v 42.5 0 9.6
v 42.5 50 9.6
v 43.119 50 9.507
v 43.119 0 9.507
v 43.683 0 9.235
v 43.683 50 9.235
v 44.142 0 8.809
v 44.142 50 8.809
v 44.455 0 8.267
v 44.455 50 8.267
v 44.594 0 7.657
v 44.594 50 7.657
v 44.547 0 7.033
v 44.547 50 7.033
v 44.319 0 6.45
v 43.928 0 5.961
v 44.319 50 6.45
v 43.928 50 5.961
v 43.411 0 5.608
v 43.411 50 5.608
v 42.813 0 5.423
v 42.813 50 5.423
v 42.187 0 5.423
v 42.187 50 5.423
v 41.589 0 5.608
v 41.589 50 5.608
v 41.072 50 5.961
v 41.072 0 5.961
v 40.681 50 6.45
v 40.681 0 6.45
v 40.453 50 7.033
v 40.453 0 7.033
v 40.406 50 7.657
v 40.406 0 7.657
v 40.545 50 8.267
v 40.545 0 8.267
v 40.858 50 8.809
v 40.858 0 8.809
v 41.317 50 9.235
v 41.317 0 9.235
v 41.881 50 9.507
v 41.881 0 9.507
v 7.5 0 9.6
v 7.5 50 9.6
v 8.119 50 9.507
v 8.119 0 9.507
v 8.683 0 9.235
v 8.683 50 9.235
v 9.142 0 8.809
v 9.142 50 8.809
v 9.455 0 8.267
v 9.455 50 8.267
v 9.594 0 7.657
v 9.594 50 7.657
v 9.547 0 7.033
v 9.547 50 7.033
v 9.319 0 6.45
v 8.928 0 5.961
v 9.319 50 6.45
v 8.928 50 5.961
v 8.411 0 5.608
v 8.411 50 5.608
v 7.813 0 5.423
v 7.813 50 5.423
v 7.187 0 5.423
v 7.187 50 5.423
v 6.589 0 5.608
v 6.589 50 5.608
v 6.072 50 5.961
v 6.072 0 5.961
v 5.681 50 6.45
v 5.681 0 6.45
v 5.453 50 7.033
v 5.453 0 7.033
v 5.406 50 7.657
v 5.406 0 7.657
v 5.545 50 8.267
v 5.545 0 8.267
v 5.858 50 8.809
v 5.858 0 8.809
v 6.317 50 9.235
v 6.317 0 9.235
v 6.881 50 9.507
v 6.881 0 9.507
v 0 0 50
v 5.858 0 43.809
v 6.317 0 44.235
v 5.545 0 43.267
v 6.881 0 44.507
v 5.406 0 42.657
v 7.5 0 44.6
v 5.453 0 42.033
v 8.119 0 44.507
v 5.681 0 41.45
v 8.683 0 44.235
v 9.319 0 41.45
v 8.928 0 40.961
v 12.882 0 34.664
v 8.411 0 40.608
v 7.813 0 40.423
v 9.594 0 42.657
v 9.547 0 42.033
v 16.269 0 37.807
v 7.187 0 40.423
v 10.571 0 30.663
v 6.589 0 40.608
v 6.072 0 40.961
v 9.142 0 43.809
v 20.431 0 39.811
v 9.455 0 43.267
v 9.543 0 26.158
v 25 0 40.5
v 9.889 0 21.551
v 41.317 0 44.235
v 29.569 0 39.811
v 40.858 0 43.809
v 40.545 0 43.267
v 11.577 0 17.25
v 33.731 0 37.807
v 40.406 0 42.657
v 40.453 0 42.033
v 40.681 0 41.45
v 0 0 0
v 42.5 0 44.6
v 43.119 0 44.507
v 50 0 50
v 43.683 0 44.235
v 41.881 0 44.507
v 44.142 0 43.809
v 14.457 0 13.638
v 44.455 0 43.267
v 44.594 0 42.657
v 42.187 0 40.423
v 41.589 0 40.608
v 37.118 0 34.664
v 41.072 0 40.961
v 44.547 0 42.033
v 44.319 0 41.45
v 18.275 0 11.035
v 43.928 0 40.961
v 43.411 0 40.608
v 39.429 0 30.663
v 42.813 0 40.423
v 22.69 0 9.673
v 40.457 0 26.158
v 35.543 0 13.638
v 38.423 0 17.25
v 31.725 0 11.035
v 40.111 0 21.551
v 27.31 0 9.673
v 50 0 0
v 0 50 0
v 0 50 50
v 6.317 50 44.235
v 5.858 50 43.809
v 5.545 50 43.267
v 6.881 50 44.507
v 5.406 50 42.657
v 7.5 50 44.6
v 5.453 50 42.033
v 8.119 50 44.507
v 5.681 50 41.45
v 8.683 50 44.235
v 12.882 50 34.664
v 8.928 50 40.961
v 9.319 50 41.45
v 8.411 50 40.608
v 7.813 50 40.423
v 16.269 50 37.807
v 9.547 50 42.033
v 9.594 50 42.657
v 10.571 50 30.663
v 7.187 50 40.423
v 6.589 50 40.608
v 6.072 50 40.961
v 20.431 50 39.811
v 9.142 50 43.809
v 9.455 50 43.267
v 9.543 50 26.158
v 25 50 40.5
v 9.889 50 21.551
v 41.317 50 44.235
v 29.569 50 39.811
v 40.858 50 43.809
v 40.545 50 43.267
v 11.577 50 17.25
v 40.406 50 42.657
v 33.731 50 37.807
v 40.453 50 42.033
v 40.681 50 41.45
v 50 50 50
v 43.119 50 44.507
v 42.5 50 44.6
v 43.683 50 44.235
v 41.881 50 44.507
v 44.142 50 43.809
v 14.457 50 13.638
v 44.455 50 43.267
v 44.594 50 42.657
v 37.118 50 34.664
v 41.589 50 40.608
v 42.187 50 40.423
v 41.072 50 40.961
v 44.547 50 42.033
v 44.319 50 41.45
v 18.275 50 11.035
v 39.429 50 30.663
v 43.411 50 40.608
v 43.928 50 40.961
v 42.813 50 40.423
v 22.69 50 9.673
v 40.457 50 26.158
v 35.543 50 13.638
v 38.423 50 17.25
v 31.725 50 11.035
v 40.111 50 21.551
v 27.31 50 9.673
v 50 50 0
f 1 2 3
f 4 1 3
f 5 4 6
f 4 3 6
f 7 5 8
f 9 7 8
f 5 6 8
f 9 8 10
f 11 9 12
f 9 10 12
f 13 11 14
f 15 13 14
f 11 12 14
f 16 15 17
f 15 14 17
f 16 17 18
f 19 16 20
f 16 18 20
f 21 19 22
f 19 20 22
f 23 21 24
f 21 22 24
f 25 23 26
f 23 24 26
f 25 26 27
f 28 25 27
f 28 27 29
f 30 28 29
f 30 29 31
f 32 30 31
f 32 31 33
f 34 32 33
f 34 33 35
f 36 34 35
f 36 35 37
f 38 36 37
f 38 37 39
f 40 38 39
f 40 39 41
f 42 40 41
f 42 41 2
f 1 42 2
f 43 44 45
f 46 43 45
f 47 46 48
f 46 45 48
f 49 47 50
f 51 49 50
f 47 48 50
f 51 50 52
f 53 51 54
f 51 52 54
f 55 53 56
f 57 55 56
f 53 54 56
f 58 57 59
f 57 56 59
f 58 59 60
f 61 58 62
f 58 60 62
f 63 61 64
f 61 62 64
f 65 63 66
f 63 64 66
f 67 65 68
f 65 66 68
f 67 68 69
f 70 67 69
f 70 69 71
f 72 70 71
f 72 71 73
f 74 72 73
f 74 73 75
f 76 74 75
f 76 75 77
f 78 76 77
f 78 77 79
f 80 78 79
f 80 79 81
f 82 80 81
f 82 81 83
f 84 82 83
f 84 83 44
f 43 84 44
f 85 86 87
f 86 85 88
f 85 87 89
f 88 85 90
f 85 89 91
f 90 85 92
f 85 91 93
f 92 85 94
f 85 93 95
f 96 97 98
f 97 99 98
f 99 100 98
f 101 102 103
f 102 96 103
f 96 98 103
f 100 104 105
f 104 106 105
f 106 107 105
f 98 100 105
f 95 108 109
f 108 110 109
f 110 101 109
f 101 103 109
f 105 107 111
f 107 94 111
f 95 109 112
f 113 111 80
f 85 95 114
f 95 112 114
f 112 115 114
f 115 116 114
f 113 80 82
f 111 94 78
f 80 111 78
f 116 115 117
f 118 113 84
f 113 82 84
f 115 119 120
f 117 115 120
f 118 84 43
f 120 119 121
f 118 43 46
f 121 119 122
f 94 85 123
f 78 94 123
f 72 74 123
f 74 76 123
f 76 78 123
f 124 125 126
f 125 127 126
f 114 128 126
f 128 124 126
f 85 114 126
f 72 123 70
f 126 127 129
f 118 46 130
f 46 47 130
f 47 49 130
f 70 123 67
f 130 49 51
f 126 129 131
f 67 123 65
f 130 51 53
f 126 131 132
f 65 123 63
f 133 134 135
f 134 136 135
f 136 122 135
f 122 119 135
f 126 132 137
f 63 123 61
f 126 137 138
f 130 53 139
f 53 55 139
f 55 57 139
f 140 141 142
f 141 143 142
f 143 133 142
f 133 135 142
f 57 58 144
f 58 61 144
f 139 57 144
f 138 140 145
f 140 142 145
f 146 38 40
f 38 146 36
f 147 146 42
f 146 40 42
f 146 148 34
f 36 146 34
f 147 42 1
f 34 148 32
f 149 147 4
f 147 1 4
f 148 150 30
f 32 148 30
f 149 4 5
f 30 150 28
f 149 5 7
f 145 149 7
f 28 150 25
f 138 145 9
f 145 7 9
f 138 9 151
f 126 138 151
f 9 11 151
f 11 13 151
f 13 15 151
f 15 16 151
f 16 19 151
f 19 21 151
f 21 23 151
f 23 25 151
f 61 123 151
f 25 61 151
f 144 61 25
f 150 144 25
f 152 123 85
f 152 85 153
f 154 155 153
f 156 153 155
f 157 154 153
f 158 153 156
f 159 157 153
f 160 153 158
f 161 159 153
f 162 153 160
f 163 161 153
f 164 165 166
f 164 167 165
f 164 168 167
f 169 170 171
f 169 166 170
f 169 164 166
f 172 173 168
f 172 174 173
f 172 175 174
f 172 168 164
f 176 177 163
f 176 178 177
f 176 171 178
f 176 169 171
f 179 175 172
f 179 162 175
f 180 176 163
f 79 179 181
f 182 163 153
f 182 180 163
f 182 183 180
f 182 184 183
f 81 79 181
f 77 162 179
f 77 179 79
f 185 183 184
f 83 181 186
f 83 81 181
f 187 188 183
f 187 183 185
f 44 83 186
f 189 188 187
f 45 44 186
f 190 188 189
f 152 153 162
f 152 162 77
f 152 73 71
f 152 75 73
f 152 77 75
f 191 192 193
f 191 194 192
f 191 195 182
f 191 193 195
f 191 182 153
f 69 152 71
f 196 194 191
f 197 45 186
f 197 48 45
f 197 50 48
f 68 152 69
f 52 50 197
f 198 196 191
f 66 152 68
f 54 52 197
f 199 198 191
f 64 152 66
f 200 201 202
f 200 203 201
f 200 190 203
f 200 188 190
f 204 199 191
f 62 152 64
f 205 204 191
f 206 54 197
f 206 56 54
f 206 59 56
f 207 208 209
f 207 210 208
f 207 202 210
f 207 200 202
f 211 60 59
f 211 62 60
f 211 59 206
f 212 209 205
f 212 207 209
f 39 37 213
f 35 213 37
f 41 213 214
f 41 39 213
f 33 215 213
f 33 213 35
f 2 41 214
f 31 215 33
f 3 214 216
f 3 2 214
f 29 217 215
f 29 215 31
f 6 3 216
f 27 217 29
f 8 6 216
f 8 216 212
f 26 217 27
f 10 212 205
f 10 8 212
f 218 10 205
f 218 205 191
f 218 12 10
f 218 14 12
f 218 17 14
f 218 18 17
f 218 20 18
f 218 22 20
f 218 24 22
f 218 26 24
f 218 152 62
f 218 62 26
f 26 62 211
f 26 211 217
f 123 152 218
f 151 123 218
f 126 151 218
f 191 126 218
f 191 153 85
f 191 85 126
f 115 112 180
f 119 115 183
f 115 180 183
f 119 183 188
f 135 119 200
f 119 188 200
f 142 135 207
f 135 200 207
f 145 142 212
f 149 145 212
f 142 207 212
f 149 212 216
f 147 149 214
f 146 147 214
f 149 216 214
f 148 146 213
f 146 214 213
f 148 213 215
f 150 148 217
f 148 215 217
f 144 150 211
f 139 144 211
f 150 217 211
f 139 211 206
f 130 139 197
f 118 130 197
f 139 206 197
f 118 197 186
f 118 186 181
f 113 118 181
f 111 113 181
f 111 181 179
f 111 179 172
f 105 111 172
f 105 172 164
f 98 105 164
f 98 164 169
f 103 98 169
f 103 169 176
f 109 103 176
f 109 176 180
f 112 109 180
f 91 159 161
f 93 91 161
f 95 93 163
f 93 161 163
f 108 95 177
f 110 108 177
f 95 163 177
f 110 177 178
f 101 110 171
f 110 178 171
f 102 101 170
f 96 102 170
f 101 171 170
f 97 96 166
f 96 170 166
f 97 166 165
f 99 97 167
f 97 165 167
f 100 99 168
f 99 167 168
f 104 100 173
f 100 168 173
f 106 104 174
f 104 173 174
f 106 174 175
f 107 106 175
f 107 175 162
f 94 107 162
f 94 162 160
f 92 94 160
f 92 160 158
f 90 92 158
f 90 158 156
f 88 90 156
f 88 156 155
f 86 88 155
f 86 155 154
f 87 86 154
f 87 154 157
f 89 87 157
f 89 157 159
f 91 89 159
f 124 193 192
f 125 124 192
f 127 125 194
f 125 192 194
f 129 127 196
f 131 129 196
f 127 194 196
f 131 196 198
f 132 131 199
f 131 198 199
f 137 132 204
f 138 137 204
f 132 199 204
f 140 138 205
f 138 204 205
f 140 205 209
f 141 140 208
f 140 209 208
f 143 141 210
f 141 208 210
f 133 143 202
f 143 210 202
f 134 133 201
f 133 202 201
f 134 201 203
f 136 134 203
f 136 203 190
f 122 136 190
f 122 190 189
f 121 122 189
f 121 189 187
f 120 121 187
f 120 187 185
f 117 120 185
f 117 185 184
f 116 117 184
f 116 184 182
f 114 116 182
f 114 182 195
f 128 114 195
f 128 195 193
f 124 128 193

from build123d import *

# Parameters (mm, degrees)
SKETCH2_W           = 50
SKETCH2_H           = 50
BOSS_EXTRUDE1_DEPTH = 50
CUT_EXTRUDE2_REACH  = 88.603
SKETCH5_R           = 2.1
CUT_EXTRUDE3_REACH  = 88.603
SKETCH6_R           = 15.5


with BuildPart() as part:
    # Sketch2 → Boss-Extrude1 (new body)
    with BuildSketch(Plane.XY):
        with Locations((25, 25)):
            Rectangle(SKETCH2_W, SKETCH2_H)
    extrude(amount=BOSS_EXTRUDE1_DEPTH)

    # Sketch5 → Cut-Extrude2 (cut, up to next)
    with BuildSketch(Plane(origin=(0, 50, 0), x_dir=(1, 0, 0), z_dir=(0, 1, 0)), mode=Mode.PRIVATE) as cut_extrude2_sk1:
        with Locations(Location((7.5, -7.5, 0), (0, 0, 270))):
            Circle(SKETCH5_R)
    cut_extrude2_tool1 = extrude(cut_extrude2_sk1.sketch, amount=-CUT_EXTRUDE2_REACH, mode=Mode.PRIVATE) & part.part
    # Sketch5 → Cut-Extrude2 (cut, up to next)
    with BuildSketch(Plane(origin=(0, 50, 0), x_dir=(1, 0, 0), z_dir=(0, 1, 0)), mode=Mode.PRIVATE) as cut_extrude2_sk2:
        with Locations(Location((42.5, -7.5, 0), (0, 0, 270))):
            Circle(SKETCH5_R)
    cut_extrude2_tool2 = extrude(cut_extrude2_sk2.sketch, amount=-CUT_EXTRUDE2_REACH, mode=Mode.PRIVATE) & part.part
    # Sketch5 → Cut-Extrude2 (cut, up to next)
    with BuildSketch(Plane(origin=(0, 50, 0), x_dir=(1, 0, 0), z_dir=(0, 1, 0)), mode=Mode.PRIVATE) as cut_extrude2_sk3:
        with Locations(Location((7.5, -42.5, 0), (0, 0, 270))):
            Circle(SKETCH5_R)
    cut_extrude2_tool3 = extrude(cut_extrude2_sk3.sketch, amount=-CUT_EXTRUDE2_REACH, mode=Mode.PRIVATE) & part.part
    # Sketch5 → Cut-Extrude2 (cut, up to next)
    with BuildSketch(Plane(origin=(0, 50, 0), x_dir=(1, 0, 0), z_dir=(0, 1, 0)), mode=Mode.PRIVATE) as cut_extrude2_sk4:
        with Locations(Location((42.5, -42.5, 0), (0, 0, 270))):
            Circle(SKETCH5_R)
    cut_extrude2_tool4 = extrude(cut_extrude2_sk4.sketch, amount=-CUT_EXTRUDE2_REACH, mode=Mode.PRIVATE) & part.part
    add(cut_extrude2_tool1.solids().sort_by_distance((7.5, 50, 7.5))[0], mode=Mode.SUBTRACT)
    add(cut_extrude2_tool2.solids().sort_by_distance((42.5, 50, 7.5))[0], mode=Mode.SUBTRACT)
    add(cut_extrude2_tool3.solids().sort_by_distance((7.5, 50, 42.5))[0], mode=Mode.SUBTRACT)
    add(cut_extrude2_tool4.solids().sort_by_distance((42.5, 50, 42.5))[0], mode=Mode.SUBTRACT)

    # Sketch6 → Cut-Extrude3 (cut, up to next)
    with BuildSketch(Plane(origin=(0, 50, 0), x_dir=(-1, 0, 0), z_dir=(0, 1, 0)), mode=Mode.PRIVATE) as cut_extrude3_sk1:
        with Locations(Location((-25, 25, 0), (0, 0, 90))):
            Circle(SKETCH6_R)
    cut_extrude3_tool1 = extrude(cut_extrude3_sk1.sketch, amount=-CUT_EXTRUDE3_REACH, mode=Mode.PRIVATE) & part.part
    add(cut_extrude3_tool1.solids().sort_by_distance((25, 50, 25))[0], mode=Mode.SUBTRACT)


solid = part.part
